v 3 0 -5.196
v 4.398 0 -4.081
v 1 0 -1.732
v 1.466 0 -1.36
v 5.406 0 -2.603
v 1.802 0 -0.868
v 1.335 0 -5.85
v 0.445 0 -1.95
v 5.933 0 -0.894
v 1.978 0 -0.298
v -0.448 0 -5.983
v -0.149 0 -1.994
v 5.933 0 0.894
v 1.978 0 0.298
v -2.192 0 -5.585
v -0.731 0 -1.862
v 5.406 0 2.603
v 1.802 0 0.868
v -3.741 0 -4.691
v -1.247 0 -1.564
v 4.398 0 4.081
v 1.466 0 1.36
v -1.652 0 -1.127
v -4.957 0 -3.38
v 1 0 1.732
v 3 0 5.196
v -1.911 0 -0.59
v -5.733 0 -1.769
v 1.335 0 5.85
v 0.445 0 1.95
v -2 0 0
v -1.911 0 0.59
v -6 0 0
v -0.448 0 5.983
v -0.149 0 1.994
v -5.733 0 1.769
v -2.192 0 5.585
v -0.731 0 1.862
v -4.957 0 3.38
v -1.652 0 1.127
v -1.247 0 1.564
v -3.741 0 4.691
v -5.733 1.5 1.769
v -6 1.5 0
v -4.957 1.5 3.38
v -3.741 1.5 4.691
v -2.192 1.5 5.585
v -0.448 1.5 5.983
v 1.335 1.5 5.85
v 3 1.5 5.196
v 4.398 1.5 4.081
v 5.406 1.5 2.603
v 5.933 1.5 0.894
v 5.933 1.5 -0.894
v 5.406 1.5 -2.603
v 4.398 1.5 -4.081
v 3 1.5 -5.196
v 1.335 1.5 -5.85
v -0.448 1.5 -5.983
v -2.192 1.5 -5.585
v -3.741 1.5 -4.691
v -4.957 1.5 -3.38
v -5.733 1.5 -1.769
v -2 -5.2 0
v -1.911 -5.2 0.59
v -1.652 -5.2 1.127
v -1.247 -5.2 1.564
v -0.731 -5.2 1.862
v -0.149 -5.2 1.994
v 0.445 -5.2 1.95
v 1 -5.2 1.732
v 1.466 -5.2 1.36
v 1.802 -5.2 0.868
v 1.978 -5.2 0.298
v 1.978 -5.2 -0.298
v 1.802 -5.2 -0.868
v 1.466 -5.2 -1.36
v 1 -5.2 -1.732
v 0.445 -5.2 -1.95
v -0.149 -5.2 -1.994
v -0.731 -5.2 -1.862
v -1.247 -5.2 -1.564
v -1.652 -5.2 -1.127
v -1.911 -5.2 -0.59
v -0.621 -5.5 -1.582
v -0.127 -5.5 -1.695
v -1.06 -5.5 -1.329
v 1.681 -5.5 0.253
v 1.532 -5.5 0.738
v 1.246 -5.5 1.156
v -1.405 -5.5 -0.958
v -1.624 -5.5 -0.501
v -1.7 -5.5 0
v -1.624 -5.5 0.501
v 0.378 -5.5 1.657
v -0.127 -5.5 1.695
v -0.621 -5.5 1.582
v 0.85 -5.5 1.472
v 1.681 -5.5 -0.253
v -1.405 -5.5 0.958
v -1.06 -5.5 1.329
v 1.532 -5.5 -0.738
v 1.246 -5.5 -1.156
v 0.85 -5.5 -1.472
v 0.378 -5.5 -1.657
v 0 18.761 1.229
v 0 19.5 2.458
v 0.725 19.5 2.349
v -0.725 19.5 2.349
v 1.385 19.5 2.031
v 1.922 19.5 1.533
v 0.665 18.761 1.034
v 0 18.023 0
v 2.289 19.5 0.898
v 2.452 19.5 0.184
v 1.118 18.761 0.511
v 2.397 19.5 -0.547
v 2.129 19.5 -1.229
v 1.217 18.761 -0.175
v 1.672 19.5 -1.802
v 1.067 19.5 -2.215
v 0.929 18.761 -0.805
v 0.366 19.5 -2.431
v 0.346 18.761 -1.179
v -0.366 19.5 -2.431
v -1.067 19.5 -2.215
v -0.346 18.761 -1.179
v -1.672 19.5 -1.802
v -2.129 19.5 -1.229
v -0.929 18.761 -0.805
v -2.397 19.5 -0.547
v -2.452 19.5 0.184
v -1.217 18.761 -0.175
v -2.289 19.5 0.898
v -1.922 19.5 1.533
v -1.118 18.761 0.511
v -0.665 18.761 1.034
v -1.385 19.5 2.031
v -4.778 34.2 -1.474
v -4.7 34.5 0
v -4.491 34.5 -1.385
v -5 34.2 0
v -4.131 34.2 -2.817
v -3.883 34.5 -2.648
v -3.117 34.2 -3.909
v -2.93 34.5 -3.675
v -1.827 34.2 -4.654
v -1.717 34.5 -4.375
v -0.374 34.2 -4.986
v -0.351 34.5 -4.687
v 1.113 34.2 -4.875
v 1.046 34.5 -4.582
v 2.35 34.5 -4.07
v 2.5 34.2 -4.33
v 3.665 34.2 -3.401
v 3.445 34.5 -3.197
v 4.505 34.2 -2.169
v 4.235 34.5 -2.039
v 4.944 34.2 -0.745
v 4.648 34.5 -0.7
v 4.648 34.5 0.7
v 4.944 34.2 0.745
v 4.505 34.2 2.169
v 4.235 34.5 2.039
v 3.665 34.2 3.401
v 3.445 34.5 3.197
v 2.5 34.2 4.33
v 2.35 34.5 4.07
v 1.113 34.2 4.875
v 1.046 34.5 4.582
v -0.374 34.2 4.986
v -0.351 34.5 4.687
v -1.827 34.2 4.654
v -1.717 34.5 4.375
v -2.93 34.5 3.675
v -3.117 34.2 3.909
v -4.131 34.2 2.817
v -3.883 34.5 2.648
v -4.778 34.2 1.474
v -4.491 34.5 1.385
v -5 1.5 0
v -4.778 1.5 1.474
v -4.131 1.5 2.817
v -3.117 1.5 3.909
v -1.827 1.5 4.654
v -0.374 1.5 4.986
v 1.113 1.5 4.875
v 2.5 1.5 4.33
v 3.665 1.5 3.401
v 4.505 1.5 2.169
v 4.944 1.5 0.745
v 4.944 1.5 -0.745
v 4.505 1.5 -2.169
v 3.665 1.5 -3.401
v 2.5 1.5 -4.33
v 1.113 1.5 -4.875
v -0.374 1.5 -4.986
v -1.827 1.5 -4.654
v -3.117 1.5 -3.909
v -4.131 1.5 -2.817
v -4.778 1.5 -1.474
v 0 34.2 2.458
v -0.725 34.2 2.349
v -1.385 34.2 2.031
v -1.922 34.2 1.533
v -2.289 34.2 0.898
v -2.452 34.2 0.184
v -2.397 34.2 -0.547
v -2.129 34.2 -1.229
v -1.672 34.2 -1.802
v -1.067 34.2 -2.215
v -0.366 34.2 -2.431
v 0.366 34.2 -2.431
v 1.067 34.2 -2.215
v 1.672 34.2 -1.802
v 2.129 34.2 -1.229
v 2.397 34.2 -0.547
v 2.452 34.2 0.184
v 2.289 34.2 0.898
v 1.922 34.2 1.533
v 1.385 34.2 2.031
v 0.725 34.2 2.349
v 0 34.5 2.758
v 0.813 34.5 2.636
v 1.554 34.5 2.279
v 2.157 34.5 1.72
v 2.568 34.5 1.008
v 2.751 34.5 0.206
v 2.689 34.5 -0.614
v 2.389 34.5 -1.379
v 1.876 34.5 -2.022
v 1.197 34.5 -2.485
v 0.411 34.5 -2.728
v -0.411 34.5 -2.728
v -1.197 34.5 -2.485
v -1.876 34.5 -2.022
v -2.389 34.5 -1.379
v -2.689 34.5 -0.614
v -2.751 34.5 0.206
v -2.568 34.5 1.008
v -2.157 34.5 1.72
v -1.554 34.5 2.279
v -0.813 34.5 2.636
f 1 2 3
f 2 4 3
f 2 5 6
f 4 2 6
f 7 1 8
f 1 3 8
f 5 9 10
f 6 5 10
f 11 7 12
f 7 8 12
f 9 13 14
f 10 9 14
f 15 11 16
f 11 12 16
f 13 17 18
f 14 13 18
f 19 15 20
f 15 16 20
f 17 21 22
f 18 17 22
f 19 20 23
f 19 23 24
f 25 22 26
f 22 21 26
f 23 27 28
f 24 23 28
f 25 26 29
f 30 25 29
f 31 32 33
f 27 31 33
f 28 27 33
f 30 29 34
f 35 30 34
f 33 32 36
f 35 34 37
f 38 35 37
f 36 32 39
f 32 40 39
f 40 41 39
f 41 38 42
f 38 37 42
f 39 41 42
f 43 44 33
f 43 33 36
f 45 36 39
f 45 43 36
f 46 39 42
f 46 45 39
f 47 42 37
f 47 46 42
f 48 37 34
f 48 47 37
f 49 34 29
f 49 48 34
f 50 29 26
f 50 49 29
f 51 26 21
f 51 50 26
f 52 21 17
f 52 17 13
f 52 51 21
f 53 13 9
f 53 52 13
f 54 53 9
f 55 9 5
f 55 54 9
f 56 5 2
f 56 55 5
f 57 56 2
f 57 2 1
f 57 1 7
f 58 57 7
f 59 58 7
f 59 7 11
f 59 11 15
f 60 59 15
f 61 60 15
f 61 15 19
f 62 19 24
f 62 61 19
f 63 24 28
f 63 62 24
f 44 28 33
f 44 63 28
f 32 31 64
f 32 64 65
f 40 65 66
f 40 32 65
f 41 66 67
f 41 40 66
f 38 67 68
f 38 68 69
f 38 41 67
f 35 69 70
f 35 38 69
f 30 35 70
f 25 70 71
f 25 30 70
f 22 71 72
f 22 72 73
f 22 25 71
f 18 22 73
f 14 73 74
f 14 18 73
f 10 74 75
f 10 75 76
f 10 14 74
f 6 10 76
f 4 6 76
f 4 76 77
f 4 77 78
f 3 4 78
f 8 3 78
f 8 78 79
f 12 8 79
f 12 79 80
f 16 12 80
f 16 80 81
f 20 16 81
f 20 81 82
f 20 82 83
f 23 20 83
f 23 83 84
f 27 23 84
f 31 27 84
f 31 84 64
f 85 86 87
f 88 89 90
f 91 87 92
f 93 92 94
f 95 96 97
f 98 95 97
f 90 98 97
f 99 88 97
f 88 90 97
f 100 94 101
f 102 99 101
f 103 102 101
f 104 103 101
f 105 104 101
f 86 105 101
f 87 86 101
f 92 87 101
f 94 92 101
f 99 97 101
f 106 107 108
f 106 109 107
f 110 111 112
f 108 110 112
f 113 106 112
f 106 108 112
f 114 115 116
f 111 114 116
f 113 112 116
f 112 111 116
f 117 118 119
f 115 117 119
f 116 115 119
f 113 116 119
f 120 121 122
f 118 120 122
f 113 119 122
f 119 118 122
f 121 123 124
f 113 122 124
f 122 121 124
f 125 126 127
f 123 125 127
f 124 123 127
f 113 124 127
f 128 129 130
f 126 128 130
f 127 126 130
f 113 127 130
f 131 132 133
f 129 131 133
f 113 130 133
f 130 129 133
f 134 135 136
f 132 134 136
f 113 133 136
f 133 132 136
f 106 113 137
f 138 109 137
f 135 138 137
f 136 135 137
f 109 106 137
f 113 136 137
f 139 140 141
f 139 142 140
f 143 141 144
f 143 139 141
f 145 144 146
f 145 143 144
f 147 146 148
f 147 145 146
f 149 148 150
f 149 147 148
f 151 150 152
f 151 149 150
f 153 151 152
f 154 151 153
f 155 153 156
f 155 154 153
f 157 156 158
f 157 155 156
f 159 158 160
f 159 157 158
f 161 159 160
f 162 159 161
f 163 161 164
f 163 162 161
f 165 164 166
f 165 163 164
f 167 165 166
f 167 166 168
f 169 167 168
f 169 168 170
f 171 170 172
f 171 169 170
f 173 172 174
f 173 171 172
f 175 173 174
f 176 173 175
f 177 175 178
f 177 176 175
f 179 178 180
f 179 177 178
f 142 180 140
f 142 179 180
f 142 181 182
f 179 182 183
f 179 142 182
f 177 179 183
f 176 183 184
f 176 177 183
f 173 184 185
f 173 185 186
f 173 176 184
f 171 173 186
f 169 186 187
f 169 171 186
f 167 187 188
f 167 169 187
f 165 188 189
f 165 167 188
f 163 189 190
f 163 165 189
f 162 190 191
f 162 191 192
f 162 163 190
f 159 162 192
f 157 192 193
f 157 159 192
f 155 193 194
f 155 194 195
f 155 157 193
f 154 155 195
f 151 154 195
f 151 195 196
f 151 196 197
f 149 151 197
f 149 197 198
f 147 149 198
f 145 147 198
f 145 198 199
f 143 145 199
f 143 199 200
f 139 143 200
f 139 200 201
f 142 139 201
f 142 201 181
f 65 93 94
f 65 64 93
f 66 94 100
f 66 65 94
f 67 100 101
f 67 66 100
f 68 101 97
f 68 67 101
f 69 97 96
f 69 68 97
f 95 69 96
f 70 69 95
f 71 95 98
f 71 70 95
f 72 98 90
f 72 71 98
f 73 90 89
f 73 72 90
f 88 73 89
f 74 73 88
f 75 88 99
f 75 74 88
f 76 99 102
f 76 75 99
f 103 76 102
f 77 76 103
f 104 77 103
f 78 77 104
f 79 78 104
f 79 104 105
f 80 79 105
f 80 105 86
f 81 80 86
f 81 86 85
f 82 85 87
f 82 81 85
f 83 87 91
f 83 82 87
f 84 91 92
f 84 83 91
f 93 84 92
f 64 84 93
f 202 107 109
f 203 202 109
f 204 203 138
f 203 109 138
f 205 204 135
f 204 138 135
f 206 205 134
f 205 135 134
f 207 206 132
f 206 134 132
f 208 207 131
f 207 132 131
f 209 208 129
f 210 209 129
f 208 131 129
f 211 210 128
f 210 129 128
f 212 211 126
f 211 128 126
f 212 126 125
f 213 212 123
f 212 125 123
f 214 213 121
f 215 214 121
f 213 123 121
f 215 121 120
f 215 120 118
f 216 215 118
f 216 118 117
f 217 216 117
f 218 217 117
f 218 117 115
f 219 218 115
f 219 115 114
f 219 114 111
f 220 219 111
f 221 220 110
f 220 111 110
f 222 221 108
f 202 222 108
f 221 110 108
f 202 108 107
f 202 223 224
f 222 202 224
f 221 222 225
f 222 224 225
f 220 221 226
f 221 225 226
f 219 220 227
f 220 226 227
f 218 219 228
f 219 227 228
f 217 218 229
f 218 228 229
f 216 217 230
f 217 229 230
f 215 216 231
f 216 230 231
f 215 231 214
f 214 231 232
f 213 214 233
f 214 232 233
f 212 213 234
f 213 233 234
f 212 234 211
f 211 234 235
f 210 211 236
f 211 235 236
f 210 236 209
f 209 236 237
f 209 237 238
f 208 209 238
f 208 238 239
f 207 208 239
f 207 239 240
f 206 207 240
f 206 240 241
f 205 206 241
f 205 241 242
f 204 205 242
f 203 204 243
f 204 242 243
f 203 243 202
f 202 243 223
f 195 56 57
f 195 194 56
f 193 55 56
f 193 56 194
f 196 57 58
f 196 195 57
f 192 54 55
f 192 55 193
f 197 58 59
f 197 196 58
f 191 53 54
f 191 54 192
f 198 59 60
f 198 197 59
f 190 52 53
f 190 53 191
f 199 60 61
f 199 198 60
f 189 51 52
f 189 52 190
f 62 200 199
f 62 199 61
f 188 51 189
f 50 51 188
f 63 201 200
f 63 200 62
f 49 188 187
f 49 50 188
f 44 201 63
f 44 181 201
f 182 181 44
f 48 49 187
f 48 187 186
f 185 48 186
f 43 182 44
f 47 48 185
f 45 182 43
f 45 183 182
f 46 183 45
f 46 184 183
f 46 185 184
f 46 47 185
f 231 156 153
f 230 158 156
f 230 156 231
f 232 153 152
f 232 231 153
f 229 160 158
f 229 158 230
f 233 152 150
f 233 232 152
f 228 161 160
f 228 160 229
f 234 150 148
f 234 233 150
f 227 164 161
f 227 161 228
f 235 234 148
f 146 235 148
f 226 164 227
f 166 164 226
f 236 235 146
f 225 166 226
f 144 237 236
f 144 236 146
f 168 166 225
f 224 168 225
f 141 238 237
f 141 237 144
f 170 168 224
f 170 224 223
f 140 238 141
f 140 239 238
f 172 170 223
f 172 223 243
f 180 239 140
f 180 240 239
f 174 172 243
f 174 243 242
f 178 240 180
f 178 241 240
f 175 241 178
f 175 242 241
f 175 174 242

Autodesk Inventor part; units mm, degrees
ref_plane "YZ Plane" through (0, 0, 0) normal (1, 0, 0) x (0, 1, 0)
ref_plane "XZ Plane" through (0, 0, 0) normal (0, 1, 0) x (-1, 0, 0)
ref_plane "XY Plane" through (0, 0, 0) normal (0, 0, 1) x (1, 0, 0)
sketch "Esboço1" plane through (0, 0, 0) normal (0, 0, 1) x (1, 0, 0)
  line L0 (-7.2, 0) -> (1.2, 0) construction
  line L1 (0, -13.5) -> (0, 42.5) construction
  line L2 (0, 34.5) -> (0, -5.5)
  line L3 (0, -5.5) -> (-2, -5.5)
  line L4 (-2, -5.5) -> (-2, 0)
  line L5 (-2, 0) -> (-6, 0)
  line L6 (-6, 0) -> (-6, 1.5)
  line L7 (-6, 1.5) -> (-5, 1.5)
  line L8 (-5, 1.5) -> (-5, 34.5)
  line L9 (-5, 34.5) -> (0, 34.5)
  point P0 (0, 0)
  dimension "d0" = 10
  dimension "d1" = 12
  dimension "d2" = 1.5
  dimension "d3" = 5.5
  dimension "d4" = 33
  dimension "d7" = 4
  dimension "d21" = 40
revolve "Revolução1" add sketch "Esboço1" angle 360 about axis through (0, -10, 0) along (0, 1, 0)
sketch "Esboço2" plane through (0, 34.5, 0) normal (0, 1, 0) x (1, 0, 0)
  circle A0 centre (0, 0) radius 5 projected
hole "Furo1" at (0, 34.5, 0) direction (0, -1, 0) diameter 4.917 depth 15 tip angle 118 thread size "M6x1" class "6H" standard "ISO Metric profile"
thread "Rosca1" size "M4x0.7" class "6g" standard "ANSI Metric M Profile" length 5
chamfer "Chanfro1" distance 0.3 angle 45 3 edges at (2, -5.5, 0) (5, 34.5, 0) (0, 34.5, -2.4585)
properties part number "Compensador Haste" material "Aço SAE 1045"
